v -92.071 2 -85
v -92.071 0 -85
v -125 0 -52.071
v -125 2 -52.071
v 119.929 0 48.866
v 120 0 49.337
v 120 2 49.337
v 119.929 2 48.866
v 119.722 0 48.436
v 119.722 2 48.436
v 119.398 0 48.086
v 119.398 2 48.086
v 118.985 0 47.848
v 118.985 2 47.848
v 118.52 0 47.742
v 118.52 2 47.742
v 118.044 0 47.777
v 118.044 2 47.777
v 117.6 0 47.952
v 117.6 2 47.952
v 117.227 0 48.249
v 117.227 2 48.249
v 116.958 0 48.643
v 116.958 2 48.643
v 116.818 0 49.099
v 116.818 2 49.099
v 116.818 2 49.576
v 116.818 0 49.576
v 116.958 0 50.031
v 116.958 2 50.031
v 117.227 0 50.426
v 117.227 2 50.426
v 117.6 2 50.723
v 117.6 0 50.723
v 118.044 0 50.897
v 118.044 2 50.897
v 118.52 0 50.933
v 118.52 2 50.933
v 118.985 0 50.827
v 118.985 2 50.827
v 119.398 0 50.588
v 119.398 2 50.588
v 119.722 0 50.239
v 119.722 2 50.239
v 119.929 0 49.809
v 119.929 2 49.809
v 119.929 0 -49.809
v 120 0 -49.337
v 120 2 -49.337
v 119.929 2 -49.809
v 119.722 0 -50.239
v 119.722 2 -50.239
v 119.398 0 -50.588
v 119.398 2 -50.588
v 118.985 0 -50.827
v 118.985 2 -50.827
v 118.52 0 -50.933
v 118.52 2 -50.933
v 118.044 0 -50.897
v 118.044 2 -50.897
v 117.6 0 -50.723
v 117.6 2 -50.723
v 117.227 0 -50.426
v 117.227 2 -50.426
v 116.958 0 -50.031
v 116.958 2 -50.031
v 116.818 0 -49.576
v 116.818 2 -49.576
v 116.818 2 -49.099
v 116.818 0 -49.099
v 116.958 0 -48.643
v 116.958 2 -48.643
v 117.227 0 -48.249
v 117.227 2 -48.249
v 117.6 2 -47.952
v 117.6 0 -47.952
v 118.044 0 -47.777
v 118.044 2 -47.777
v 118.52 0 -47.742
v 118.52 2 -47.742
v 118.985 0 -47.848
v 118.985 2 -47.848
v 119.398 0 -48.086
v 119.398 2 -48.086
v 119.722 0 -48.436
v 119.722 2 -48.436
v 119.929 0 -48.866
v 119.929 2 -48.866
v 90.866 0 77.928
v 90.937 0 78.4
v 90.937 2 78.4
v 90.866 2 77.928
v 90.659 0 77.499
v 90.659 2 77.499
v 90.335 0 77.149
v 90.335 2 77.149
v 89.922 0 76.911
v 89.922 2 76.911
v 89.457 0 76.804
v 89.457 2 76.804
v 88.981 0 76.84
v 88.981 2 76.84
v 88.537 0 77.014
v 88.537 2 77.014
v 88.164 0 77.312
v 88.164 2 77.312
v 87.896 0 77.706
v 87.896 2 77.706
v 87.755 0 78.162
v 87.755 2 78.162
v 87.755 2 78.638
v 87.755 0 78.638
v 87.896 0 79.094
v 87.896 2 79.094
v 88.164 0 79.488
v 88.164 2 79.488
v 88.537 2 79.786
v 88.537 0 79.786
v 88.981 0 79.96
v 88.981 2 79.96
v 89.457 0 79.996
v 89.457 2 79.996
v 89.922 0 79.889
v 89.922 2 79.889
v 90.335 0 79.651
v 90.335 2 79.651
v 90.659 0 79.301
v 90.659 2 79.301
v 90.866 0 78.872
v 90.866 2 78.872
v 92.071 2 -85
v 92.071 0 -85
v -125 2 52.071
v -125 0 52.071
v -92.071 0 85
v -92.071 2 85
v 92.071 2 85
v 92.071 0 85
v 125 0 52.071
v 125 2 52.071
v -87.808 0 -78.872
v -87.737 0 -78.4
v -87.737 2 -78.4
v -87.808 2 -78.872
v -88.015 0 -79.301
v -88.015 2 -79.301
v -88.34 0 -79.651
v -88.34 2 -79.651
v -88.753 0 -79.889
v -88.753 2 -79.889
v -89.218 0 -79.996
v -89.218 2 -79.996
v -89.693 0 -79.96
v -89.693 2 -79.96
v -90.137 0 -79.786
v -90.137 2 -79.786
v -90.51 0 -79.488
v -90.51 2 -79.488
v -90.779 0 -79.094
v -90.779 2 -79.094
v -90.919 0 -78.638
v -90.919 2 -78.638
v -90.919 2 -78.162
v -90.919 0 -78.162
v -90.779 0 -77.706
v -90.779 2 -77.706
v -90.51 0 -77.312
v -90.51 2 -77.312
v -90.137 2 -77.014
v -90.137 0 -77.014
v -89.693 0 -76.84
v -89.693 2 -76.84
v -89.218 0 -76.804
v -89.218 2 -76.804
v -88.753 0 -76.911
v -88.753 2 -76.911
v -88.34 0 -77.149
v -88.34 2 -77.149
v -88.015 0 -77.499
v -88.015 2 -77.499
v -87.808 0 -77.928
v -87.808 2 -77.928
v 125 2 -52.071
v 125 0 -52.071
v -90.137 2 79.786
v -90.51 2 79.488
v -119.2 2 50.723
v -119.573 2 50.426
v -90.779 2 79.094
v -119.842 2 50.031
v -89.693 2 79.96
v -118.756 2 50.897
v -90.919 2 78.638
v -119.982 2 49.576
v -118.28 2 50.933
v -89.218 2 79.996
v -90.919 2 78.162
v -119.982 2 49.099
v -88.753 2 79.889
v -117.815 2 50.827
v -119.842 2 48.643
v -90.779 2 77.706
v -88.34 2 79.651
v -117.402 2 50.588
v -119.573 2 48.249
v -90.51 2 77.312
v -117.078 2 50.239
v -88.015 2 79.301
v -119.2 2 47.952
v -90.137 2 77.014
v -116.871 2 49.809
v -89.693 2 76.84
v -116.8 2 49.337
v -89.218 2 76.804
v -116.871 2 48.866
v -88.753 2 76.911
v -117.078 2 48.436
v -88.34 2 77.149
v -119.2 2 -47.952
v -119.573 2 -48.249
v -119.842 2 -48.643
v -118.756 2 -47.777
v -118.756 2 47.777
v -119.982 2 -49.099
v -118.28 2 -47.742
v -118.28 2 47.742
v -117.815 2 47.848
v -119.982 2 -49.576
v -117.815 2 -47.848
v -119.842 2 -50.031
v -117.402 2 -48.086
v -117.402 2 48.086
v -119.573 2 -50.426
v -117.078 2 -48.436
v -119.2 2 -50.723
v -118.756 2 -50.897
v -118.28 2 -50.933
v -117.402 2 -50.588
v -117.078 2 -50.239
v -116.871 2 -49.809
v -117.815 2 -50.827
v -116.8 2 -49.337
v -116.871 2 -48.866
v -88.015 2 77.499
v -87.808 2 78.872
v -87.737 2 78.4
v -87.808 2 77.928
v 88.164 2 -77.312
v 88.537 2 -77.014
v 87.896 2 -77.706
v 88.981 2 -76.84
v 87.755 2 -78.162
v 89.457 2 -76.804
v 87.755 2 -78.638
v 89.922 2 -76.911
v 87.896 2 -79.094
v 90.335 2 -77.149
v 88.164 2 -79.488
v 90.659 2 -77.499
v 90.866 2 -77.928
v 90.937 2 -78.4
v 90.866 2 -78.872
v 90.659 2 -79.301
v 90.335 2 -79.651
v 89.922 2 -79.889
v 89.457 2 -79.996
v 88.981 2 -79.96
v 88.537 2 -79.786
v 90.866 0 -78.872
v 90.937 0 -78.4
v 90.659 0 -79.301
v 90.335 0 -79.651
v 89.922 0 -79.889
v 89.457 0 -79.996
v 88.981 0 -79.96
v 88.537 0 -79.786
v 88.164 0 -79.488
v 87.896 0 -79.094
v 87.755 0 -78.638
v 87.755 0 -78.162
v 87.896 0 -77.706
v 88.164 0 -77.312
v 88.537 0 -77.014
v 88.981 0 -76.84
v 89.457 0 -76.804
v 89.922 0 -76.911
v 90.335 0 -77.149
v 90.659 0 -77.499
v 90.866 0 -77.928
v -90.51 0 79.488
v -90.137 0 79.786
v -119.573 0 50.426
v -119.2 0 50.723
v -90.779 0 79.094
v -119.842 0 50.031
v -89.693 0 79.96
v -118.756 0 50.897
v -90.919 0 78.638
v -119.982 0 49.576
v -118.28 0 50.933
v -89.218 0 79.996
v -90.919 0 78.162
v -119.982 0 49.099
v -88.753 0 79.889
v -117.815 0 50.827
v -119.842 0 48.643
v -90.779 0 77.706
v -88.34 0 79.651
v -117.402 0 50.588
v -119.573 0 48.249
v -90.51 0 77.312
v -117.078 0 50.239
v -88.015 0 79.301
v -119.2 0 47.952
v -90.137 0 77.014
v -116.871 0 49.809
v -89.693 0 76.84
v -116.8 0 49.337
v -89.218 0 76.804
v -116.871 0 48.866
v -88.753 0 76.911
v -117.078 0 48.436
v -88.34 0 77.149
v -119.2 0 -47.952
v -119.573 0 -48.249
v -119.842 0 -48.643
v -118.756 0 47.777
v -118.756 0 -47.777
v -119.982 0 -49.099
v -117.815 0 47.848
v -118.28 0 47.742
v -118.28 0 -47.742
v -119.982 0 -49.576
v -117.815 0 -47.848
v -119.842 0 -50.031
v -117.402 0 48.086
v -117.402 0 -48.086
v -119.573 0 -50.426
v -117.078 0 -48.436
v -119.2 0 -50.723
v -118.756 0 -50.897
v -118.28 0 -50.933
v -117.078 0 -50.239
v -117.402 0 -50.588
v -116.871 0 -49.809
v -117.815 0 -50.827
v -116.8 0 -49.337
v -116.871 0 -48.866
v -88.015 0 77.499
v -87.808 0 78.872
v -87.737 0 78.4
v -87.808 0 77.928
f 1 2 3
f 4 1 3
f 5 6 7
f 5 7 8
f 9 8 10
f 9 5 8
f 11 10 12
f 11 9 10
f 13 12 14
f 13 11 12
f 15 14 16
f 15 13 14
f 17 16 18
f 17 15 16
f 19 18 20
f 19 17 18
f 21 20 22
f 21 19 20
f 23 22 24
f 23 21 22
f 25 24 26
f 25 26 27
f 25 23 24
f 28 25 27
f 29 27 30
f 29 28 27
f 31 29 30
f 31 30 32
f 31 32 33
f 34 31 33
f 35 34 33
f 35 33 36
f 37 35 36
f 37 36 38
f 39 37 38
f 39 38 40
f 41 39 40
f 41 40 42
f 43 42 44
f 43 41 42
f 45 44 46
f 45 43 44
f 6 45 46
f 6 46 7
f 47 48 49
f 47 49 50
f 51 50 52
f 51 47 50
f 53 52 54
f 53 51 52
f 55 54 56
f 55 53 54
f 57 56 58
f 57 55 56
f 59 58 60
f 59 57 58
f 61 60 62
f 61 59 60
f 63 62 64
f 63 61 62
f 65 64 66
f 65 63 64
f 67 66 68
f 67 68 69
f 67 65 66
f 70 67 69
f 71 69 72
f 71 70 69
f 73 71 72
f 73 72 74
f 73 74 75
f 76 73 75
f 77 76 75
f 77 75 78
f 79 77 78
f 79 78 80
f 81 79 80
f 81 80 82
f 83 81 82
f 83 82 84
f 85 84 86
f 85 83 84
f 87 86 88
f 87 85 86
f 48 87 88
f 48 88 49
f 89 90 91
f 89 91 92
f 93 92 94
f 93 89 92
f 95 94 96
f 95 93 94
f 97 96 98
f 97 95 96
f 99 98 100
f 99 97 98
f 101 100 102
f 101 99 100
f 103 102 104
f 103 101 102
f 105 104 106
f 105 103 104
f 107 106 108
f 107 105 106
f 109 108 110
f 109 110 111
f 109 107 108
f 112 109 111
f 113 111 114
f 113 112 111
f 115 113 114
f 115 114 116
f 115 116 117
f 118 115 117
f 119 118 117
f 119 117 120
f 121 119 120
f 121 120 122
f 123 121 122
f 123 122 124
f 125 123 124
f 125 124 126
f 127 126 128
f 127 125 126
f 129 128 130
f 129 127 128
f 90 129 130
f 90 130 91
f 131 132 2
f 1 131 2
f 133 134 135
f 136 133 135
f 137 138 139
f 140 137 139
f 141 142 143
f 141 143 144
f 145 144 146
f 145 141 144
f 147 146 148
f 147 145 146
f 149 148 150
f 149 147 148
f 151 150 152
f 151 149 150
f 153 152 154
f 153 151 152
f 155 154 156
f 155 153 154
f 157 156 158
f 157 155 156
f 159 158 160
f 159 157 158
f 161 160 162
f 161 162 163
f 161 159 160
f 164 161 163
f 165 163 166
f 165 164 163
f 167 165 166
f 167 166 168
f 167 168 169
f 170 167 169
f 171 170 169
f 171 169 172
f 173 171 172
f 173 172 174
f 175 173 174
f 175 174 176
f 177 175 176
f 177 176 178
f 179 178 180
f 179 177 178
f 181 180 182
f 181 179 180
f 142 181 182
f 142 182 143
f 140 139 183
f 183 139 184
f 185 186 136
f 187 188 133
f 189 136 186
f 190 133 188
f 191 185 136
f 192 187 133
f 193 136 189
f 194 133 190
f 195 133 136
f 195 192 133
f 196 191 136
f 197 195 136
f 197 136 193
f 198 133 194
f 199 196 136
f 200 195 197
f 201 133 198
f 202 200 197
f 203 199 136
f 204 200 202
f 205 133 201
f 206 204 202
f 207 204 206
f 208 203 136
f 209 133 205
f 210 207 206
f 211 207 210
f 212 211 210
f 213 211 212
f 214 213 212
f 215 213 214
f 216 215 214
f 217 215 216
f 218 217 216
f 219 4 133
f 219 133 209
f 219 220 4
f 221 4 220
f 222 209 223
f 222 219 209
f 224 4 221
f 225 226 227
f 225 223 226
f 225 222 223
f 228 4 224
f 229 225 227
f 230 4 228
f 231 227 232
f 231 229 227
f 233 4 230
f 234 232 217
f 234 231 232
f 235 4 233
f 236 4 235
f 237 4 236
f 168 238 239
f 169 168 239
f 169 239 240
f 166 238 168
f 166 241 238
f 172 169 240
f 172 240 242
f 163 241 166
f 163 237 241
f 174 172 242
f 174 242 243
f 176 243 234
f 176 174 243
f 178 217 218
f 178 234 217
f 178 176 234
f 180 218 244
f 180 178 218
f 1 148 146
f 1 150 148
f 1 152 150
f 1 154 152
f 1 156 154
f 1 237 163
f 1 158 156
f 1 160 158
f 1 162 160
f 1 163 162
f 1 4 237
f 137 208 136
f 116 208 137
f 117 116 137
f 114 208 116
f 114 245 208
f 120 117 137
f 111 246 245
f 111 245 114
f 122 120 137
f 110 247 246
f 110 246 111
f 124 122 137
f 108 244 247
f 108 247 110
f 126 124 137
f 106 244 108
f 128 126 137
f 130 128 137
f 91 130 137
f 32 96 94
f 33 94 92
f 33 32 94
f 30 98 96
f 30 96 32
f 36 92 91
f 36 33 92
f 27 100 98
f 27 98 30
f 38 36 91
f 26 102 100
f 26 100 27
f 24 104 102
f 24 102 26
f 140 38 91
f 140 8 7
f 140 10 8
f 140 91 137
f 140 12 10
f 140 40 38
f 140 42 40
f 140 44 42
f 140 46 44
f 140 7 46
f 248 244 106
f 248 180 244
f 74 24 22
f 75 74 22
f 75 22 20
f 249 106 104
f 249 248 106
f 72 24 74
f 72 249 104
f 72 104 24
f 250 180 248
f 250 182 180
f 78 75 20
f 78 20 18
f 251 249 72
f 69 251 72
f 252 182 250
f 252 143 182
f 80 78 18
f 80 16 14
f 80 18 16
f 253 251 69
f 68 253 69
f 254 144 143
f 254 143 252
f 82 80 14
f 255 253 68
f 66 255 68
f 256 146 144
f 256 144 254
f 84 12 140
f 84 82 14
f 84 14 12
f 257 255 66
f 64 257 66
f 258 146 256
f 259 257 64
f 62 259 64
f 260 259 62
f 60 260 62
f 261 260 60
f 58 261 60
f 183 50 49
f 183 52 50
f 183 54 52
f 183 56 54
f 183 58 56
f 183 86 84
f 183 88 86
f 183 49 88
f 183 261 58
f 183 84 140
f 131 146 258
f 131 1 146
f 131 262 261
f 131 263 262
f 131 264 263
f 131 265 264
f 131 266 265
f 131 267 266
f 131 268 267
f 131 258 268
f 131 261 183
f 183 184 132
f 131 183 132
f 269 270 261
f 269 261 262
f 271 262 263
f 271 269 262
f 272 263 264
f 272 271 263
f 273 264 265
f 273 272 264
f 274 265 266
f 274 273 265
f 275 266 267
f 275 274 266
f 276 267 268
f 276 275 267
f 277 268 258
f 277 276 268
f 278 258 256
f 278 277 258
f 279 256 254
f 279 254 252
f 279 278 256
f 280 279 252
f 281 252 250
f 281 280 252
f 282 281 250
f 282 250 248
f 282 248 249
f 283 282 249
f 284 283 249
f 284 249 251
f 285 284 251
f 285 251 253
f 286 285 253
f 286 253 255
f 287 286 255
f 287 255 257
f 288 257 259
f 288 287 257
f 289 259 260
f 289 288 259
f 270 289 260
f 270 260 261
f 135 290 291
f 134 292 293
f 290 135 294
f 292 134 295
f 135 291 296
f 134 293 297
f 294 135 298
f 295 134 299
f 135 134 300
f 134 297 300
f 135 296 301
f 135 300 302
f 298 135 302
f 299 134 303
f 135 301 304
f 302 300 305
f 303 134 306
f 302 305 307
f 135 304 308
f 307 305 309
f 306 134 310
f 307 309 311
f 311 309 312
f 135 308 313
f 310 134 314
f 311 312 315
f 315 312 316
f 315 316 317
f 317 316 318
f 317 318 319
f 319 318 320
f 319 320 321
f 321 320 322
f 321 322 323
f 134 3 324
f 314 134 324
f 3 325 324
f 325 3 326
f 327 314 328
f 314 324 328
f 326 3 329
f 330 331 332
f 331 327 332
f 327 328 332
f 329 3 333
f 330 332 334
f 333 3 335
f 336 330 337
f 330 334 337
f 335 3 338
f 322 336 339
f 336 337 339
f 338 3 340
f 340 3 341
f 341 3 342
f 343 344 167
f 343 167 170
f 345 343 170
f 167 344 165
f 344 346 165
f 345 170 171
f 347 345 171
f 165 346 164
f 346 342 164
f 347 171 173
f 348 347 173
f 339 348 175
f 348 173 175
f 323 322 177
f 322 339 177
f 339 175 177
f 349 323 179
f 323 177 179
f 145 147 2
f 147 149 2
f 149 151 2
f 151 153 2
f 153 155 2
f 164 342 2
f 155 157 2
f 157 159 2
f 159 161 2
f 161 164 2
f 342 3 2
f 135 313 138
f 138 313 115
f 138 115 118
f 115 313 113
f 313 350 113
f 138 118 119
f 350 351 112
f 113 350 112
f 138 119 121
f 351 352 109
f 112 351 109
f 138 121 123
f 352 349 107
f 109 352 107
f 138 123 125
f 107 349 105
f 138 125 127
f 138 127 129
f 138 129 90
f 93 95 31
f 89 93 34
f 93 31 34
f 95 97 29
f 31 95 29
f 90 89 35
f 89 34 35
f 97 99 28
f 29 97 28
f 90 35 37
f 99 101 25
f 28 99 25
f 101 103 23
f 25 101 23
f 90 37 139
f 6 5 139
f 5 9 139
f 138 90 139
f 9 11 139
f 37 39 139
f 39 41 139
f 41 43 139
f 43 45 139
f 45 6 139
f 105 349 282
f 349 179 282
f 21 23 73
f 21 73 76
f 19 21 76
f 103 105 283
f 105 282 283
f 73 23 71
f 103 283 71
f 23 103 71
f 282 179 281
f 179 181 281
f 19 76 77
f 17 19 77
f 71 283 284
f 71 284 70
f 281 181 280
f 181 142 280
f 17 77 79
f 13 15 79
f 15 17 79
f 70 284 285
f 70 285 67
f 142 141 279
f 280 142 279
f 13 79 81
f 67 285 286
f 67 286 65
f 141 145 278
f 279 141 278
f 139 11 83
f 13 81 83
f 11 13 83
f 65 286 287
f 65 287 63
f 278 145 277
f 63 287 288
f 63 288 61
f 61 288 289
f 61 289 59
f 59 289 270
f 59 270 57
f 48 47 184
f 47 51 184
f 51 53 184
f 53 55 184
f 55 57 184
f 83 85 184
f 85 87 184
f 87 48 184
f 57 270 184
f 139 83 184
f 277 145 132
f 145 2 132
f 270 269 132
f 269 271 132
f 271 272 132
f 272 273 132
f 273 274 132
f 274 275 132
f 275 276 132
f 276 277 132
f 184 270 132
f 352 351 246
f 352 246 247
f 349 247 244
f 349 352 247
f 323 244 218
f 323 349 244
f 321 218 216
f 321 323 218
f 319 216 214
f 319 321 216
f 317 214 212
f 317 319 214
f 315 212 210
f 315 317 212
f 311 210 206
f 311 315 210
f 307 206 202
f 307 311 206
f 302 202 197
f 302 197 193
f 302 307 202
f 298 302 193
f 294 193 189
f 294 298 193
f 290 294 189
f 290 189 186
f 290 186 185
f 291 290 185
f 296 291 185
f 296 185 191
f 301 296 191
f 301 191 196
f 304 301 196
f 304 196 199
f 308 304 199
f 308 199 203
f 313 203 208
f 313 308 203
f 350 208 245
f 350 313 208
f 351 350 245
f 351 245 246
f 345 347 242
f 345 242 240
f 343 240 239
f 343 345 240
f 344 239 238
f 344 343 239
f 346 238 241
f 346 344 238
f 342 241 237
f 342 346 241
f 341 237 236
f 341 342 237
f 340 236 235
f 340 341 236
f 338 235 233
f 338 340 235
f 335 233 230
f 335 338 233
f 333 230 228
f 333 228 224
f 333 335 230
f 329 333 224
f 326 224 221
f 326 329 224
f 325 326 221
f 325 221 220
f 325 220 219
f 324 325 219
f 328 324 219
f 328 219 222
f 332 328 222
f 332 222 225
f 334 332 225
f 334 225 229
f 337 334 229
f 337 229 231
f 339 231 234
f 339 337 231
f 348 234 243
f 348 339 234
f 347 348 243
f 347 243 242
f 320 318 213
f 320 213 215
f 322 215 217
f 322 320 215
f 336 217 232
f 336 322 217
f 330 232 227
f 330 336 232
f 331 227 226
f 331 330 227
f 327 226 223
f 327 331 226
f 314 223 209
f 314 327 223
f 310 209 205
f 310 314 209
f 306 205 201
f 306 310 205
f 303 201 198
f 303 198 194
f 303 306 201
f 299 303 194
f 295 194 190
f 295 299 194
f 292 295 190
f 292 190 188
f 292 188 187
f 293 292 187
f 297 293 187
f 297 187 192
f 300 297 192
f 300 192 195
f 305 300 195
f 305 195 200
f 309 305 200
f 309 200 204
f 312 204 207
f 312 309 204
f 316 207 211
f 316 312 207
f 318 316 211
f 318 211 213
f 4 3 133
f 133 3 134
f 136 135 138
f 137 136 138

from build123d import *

# Parameters (mm, degrees)
SKETCH1_R           = 1.6
BOSS_EXTRUDE1_DEPTH = 2


with BuildPart() as part:
    # Sketch1 → Boss-Extrude1 (new body)
    with BuildSketch(Plane(origin=(0, 0, 0), x_dir=(1, 0, 0), z_dir=(0, 1, 0))):
        Polygon((125, 52.071067812), (92.071067812, 85), (-92.071067812, 85), (-125, 52.071067812), (-125, -52.071067812), (-92.071067812, -85), (92.071067812, -85), (125, -52.071067812), align=None)
        with Locations((-89.3372583, -78.4)):
            Circle(SKETCH1_R, mode=Mode.SUBTRACT)
        with Locations((-118.4, -49.3372583)):
            Circle(SKETCH1_R, mode=Mode.SUBTRACT)
        with Locations((-118.4, 49.3372583)):
            Circle(SKETCH1_R, mode=Mode.SUBTRACT)
        with Locations((-89.3372583, 78.4)):
            Circle(SKETCH1_R, mode=Mode.SUBTRACT)
        with Locations((89.3372583, 78.4)):
            Circle(SKETCH1_R, mode=Mode.SUBTRACT)
        with Locations((118.4, 49.3372583)):
            Circle(SKETCH1_R, mode=Mode.SUBTRACT)
        with Locations((118.4, -49.3372583)):
            Circle(SKETCH1_R, mode=Mode.SUBTRACT)
        with Locations((89.3372583, -78.4)):
            Circle(SKETCH1_R, mode=Mode.SUBTRACT)
    extrude(amount=BOSS_EXTRUDE1_DEPTH)


solid = part.part
